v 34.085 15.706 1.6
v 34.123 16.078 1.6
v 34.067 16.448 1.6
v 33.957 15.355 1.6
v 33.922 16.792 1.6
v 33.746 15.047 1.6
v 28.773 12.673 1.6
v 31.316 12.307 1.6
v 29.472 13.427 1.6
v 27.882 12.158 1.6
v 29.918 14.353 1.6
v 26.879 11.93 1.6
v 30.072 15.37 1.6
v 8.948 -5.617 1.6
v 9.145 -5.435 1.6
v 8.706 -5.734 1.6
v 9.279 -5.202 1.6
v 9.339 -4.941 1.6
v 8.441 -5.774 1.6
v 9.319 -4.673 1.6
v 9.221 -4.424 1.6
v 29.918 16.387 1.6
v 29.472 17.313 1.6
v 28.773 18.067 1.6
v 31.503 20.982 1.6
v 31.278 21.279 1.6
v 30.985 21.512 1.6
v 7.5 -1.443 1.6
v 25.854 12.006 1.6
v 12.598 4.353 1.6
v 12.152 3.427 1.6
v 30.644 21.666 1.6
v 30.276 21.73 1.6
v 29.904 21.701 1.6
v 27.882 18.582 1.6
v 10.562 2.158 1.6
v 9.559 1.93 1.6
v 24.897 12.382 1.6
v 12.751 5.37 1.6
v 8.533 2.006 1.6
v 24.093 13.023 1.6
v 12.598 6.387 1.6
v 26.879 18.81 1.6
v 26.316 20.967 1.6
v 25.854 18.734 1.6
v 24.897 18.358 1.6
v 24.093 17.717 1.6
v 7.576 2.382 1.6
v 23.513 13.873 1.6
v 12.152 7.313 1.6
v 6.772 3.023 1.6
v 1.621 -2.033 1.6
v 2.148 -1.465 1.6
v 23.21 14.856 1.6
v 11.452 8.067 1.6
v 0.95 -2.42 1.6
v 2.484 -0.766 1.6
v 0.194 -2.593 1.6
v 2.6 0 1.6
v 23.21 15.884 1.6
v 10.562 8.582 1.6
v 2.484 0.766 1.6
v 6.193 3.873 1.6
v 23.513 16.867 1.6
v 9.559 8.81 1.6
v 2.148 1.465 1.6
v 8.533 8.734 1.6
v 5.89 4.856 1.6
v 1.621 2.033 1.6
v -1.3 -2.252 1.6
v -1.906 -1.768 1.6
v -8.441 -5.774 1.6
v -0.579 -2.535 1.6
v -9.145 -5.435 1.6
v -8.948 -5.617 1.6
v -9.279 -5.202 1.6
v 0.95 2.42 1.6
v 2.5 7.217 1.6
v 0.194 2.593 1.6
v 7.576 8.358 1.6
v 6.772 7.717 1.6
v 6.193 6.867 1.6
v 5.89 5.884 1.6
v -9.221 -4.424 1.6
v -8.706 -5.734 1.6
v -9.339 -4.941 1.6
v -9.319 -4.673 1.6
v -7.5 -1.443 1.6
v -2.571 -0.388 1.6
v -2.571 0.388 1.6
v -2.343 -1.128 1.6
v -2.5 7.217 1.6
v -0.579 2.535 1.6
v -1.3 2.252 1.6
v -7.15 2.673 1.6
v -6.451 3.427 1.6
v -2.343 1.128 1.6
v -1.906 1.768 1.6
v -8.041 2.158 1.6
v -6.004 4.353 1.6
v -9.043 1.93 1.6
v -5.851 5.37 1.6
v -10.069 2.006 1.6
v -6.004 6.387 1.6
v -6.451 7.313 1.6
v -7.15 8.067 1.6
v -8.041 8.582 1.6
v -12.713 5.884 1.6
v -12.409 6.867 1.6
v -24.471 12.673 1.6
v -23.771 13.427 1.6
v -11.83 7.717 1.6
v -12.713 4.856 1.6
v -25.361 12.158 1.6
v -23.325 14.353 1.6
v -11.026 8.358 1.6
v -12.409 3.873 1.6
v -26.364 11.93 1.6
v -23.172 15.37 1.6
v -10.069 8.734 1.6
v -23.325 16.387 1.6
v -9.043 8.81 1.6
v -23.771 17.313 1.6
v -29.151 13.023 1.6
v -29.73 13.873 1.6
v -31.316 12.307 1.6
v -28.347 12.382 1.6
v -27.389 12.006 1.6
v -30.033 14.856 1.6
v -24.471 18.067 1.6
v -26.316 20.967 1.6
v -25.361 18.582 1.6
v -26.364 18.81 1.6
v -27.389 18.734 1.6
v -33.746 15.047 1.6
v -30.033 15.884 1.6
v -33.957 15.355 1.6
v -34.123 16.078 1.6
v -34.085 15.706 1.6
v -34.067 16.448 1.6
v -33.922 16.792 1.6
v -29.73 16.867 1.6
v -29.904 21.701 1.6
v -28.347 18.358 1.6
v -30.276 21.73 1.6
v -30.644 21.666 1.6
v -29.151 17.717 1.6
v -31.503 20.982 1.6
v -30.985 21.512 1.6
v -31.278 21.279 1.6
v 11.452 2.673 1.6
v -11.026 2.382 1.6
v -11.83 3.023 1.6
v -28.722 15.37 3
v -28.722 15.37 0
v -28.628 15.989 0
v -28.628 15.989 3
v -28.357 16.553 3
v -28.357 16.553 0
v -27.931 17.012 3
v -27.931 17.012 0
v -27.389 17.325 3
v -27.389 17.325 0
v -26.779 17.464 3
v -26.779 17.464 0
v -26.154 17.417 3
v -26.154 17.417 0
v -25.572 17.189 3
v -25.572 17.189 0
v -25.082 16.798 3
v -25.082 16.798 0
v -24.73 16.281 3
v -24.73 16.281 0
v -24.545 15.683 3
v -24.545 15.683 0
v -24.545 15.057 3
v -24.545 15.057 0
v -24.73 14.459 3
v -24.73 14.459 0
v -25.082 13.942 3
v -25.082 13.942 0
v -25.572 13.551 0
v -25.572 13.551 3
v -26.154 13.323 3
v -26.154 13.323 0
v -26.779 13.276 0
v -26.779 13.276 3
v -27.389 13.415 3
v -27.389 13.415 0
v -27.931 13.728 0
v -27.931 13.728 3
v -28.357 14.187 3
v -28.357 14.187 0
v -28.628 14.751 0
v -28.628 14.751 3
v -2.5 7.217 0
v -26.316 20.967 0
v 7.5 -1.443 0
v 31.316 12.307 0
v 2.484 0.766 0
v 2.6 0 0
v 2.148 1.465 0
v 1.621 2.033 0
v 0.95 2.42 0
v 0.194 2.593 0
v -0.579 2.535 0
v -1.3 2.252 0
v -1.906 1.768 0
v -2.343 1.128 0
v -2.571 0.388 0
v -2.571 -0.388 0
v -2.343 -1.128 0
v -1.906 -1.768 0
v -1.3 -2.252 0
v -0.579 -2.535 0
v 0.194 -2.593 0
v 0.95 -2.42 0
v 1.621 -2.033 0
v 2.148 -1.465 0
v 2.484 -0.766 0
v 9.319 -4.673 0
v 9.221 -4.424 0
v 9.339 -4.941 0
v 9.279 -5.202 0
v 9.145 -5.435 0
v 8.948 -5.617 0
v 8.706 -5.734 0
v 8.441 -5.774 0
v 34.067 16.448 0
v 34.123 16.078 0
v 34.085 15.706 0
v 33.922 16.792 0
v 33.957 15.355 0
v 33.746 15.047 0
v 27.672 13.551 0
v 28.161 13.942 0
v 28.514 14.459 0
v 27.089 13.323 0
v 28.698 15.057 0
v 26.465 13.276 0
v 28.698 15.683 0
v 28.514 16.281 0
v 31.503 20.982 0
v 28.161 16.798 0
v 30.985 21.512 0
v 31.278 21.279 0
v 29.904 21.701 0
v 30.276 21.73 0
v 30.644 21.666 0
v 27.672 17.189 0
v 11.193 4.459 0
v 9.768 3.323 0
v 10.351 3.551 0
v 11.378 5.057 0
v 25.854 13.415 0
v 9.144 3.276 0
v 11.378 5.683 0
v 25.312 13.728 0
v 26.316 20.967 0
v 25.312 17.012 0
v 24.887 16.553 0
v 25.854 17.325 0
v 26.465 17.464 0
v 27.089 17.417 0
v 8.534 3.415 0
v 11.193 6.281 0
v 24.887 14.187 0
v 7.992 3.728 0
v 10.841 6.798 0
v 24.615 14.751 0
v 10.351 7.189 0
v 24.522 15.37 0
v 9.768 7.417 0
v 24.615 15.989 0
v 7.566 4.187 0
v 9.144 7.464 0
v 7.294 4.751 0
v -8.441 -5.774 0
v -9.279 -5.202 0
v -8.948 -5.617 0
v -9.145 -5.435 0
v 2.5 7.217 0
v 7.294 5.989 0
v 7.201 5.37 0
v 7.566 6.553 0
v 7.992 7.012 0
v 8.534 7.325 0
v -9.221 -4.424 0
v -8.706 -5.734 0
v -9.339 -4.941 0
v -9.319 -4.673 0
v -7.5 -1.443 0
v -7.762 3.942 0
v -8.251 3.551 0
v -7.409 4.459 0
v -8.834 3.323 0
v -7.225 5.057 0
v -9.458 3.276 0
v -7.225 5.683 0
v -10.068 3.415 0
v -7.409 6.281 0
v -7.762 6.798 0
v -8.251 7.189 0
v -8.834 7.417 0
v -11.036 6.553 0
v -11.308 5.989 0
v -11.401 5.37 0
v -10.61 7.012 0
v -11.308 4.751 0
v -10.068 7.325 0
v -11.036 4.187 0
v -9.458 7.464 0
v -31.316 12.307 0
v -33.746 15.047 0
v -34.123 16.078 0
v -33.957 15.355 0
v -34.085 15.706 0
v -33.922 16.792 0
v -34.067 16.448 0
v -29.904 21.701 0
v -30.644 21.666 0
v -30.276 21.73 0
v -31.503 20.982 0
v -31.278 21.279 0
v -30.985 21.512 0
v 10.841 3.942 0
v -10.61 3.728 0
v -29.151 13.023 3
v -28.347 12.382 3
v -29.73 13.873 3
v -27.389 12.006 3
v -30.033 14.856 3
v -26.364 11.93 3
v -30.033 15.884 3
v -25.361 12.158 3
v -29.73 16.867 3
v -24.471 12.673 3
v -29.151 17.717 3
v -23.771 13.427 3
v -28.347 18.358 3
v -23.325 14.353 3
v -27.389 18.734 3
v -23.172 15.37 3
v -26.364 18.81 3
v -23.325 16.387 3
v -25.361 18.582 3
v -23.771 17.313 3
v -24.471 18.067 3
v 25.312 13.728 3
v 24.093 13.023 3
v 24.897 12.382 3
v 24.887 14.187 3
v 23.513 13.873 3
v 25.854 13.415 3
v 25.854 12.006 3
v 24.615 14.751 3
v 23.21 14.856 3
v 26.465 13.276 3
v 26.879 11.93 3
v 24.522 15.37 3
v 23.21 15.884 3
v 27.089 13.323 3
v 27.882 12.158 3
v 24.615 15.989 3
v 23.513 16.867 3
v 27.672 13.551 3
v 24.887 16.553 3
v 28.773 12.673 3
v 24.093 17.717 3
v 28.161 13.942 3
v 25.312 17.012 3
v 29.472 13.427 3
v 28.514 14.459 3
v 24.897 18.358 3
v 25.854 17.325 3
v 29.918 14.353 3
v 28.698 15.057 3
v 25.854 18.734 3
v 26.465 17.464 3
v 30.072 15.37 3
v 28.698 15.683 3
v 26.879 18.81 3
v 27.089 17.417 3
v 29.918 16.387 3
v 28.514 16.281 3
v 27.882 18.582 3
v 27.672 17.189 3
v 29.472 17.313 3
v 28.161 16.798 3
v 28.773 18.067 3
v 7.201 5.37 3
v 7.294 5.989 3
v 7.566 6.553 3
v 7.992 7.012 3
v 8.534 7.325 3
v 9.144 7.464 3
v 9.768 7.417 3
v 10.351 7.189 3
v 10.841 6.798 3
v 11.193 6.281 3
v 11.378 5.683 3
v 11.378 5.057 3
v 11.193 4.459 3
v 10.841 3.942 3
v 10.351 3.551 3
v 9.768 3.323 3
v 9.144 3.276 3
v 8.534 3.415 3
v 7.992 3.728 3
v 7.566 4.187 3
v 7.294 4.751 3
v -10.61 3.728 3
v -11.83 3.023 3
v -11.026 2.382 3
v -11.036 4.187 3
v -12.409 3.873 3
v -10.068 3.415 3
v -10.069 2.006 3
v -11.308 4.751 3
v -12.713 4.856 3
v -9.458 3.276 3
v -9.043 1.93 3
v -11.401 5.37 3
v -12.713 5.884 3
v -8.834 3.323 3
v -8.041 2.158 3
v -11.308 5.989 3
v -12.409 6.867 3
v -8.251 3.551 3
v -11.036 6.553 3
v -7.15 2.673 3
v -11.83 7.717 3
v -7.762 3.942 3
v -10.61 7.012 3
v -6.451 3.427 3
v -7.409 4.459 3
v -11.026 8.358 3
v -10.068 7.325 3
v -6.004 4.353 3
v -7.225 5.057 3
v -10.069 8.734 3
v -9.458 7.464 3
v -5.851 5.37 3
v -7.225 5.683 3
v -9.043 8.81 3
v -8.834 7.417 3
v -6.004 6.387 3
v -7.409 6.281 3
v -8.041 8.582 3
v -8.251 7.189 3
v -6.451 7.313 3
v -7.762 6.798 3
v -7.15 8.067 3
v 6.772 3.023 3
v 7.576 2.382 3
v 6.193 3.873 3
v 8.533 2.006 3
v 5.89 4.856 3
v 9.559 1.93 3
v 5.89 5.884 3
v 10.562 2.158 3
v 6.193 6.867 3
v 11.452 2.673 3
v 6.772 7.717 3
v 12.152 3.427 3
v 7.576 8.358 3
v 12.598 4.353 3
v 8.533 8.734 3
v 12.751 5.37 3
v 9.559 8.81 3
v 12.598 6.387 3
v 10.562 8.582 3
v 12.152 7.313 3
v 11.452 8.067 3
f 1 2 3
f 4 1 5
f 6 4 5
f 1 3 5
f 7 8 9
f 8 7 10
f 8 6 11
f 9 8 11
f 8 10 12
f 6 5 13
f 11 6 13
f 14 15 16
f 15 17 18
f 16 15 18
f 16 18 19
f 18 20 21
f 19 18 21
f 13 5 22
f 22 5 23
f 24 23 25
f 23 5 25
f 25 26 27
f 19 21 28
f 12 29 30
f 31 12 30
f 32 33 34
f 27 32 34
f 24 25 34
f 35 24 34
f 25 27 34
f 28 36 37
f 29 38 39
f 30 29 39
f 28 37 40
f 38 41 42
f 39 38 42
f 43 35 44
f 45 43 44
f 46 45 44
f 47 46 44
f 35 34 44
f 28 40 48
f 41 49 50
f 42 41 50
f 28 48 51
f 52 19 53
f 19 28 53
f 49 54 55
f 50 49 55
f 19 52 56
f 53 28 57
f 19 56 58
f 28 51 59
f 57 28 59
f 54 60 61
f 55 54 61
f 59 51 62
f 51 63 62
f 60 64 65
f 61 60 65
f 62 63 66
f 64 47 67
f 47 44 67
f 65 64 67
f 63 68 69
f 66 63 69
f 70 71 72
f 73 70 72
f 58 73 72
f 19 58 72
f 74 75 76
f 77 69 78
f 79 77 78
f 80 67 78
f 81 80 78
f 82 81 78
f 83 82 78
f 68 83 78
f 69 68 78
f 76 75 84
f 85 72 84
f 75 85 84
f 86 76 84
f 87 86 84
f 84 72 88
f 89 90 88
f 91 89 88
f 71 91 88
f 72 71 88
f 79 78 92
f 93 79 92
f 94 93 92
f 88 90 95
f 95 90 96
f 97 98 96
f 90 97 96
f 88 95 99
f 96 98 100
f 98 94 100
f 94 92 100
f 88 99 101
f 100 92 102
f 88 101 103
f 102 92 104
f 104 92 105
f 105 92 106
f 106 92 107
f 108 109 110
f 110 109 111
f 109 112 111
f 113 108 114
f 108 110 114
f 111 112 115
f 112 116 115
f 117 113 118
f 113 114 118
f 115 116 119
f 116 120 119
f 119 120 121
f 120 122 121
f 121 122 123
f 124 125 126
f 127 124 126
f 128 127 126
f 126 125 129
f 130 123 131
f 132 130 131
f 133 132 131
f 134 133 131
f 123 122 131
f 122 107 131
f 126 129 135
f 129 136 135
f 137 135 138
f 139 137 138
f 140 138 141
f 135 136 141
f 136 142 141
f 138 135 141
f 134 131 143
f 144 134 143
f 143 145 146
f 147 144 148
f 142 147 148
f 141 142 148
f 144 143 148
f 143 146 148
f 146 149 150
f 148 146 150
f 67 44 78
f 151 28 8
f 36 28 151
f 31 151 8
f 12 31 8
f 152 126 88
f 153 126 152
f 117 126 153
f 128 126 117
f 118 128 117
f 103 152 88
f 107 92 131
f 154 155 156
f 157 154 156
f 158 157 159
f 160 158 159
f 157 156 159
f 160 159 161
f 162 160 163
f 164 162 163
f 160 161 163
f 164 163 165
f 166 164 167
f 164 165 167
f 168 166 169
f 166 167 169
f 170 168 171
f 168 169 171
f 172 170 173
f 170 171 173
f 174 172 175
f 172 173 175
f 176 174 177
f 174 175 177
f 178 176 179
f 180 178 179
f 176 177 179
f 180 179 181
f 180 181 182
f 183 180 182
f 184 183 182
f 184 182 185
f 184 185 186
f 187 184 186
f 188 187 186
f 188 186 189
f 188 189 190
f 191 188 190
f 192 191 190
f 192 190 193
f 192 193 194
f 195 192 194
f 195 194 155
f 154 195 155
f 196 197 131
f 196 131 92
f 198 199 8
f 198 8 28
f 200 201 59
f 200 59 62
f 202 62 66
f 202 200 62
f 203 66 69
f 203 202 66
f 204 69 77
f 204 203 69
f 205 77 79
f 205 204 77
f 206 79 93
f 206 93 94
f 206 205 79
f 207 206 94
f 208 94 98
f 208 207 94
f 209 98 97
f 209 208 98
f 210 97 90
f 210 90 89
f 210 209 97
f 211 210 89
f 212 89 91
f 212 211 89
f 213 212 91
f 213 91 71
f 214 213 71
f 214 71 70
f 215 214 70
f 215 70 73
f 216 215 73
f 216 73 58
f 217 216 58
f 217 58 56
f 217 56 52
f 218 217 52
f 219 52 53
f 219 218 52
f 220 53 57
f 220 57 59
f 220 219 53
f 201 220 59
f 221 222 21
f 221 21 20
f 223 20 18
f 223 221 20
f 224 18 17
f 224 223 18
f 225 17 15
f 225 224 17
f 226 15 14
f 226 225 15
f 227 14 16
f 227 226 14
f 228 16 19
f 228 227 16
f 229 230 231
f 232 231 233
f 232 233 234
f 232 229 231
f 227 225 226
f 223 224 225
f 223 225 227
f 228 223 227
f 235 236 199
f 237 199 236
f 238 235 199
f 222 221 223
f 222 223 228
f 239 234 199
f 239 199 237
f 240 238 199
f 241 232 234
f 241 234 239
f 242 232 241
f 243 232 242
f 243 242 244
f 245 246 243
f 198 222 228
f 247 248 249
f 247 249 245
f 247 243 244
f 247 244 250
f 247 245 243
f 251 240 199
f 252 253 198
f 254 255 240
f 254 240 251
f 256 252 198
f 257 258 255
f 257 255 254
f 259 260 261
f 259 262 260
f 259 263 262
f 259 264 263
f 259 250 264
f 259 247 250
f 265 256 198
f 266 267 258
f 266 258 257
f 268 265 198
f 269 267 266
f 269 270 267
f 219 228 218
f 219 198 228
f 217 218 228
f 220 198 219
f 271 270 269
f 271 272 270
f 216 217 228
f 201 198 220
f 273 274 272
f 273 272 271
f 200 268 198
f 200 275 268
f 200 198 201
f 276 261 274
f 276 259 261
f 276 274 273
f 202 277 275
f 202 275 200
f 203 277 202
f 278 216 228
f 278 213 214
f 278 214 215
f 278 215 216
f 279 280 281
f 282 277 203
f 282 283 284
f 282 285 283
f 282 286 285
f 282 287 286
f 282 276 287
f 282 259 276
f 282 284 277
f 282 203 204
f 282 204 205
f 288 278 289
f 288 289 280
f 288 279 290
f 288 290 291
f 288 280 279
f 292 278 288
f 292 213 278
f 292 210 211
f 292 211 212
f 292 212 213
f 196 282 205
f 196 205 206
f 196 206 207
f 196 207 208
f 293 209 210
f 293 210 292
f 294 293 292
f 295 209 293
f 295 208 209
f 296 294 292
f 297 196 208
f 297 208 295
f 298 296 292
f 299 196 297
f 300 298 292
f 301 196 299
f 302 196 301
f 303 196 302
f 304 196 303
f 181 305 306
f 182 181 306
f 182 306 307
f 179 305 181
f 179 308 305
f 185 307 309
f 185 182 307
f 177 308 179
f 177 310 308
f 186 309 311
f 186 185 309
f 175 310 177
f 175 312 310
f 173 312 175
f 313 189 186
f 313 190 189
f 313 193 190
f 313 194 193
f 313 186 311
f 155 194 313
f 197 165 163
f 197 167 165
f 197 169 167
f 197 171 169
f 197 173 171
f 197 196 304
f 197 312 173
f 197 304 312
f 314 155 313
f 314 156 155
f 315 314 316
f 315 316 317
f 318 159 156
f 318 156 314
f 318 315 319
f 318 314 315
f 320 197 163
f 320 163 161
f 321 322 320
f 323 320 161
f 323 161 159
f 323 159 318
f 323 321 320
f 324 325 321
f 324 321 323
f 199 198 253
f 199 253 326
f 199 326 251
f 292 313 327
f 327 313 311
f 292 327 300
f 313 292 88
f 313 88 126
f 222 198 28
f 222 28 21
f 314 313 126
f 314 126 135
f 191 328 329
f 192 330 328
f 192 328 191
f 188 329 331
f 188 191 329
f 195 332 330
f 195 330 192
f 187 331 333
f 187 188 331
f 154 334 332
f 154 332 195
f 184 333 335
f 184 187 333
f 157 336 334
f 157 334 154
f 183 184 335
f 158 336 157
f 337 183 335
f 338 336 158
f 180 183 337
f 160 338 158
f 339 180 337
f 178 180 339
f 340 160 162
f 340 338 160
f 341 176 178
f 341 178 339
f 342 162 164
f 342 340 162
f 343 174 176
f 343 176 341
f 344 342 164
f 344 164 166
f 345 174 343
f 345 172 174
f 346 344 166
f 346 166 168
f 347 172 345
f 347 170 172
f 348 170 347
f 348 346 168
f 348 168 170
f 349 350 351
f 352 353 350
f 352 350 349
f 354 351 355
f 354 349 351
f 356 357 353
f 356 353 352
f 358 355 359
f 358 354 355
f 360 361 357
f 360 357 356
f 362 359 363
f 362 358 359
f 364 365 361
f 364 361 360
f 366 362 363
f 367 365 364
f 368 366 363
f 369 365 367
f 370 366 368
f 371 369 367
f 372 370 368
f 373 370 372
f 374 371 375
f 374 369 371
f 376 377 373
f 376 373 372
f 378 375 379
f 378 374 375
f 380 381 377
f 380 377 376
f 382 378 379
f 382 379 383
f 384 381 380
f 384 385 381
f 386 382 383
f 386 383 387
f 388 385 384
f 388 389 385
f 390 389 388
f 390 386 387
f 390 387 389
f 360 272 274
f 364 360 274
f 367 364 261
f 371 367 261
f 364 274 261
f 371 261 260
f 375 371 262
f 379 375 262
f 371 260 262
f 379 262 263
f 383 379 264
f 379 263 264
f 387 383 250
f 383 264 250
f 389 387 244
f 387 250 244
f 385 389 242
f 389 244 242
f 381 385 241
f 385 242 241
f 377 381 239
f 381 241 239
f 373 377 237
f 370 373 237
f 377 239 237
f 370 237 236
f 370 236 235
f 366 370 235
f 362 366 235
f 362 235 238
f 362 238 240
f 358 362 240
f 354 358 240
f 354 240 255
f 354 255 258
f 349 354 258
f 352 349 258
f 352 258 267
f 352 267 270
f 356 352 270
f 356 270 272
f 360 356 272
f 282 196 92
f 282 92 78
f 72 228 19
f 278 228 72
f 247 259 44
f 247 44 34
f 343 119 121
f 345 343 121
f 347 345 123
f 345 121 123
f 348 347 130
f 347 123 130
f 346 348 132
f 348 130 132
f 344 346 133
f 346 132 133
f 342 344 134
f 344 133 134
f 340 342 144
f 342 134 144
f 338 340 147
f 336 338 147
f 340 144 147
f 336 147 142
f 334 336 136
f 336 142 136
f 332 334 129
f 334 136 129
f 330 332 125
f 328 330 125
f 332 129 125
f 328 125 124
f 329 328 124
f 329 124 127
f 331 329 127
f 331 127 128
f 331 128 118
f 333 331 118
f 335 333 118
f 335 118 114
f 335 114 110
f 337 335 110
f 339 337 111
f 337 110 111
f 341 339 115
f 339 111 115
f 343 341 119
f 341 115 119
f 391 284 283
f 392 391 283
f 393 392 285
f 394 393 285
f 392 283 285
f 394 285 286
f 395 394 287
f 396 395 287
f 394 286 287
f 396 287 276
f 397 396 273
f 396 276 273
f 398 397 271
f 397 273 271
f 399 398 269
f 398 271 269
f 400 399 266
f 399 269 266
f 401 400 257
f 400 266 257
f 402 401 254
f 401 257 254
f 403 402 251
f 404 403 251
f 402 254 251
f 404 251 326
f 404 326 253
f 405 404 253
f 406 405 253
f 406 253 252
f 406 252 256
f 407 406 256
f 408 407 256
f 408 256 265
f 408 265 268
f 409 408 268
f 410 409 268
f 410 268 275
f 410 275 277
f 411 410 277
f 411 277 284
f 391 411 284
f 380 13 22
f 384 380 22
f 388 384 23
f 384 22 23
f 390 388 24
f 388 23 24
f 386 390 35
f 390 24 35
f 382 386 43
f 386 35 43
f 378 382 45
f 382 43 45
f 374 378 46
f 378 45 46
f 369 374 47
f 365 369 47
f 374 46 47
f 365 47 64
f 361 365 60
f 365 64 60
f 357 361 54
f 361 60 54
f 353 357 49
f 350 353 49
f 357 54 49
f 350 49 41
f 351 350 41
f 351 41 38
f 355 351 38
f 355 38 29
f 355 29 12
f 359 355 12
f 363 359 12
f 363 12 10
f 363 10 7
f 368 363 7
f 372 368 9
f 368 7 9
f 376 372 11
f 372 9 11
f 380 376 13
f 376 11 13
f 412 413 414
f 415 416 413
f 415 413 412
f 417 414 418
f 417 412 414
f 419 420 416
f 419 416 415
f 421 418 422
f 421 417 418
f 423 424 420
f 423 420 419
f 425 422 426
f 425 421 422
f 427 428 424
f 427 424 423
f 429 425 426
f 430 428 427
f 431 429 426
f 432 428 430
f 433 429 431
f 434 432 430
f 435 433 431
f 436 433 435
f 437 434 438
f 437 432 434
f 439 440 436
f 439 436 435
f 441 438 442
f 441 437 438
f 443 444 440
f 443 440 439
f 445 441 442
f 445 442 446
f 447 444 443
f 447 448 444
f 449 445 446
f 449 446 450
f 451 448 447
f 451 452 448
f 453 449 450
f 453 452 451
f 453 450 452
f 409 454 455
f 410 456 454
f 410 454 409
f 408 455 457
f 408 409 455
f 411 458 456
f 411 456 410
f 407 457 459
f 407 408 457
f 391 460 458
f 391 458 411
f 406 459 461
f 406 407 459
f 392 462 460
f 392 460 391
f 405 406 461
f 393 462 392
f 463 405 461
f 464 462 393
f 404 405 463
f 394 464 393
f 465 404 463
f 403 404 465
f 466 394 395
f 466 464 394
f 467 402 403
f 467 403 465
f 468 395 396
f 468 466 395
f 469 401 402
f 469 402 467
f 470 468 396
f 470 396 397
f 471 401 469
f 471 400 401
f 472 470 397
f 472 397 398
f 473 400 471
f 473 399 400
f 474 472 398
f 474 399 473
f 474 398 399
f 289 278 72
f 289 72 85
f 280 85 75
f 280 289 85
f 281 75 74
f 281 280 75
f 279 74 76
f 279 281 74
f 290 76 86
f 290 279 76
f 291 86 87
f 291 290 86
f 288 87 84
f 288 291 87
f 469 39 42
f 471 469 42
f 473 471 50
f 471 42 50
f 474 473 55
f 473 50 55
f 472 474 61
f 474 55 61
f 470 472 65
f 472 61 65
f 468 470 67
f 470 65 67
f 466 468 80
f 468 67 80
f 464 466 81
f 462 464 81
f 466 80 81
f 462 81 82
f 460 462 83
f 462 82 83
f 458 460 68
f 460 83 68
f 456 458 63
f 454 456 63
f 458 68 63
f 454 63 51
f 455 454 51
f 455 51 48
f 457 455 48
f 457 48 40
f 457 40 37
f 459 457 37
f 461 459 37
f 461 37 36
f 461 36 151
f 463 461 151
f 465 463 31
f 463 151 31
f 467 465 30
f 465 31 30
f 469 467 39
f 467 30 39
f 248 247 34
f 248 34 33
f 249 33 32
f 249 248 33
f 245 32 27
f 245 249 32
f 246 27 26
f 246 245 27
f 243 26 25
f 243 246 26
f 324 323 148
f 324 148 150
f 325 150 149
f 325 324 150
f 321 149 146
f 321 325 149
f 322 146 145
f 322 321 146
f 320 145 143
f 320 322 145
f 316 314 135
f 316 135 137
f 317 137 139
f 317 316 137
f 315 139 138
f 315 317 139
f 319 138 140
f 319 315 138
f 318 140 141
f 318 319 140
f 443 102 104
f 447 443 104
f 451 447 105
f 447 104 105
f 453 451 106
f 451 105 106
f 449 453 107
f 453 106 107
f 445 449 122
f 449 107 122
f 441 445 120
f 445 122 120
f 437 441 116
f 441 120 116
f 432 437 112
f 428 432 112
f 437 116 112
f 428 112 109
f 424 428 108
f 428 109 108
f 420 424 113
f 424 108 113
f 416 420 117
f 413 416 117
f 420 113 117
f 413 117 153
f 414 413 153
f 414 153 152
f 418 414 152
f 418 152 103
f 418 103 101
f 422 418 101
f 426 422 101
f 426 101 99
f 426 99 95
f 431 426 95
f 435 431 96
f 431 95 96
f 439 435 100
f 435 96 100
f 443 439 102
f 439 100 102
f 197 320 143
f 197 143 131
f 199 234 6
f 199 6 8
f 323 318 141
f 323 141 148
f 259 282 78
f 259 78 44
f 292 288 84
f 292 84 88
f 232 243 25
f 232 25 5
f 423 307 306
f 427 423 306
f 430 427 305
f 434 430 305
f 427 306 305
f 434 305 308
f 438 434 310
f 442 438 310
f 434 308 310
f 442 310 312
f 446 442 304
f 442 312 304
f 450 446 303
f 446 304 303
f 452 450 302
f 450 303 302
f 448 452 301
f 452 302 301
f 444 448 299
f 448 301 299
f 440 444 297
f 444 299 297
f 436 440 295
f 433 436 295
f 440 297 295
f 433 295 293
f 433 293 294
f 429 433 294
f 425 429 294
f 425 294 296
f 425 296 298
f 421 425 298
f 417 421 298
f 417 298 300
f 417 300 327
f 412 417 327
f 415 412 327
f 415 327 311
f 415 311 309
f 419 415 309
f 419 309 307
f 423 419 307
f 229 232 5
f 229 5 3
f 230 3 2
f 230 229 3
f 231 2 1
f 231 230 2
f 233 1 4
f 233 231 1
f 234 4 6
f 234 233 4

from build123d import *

# Parameters (mm, degrees)
SKETCH1_R             = 2.6
BOSS_EXTRUDE1_DEPTH   = 1.6
SKETCH2_R             = 3.45
BOSS_EXTRUDE2_DEPTH   = 1.4
M5X0_8_TAPPED_HOLE1_D = 4.2


with BuildPart() as part:
    # Sketch1 → Boss-Extrude1 (new body)
    with BuildSketch(Plane.XY):
        with BuildLine():
            Line((-2.5, 7.216878365), (2.5, 7.216878365))
            Line((2.5, 7.216878365), (26.315698604, 20.966878365))
            Line((26.315698604, 20.966878365), (29.903623675, 21.701093146))
            ThreePointArc((29.903623675, 21.701093146), (30.819646028, 21.599539147), (31.503382336, 20.981546567))
            Line((31.503382336, 20.981546567), (33.922243506, 16.791956125))
            ThreePointArc((33.922243506, 16.791956125), (34.115572625, 15.890826823), (33.745509792, 15.046751195))
            Line((33.745509792, 15.046751195), (31.315698604, 12.306624327))
            Line((31.315698604, 12.306624327), (7.5, -1.443375673))
            Line((7.5, -1.443375673), (9.220577137, -4.423502692))
            ThreePointArc((9.220577137, -4.423502692), (9.220577137, -5.323502692), (8.441154273, -5.773502692))
            Line((8.441154273, -5.773502692), (-8.441154273, -5.773502692))
            ThreePointArc((-8.441154273, -5.773502692), (-9.220577137, -5.323502692), (-9.220577137, -4.423502692))
            Line((-9.220577137, -4.423502692), (-7.5, -1.443375673))
            Line((-7.5, -1.443375673), (-31.315698604, 12.306624327))
            Line((-31.315698604, 12.306624327), (-33.745509792, 15.046751195))
            ThreePointArc((-33.745509792, 15.046751195), (-34.115572625, 15.890826823), (-33.922243506, 16.791956125))
            Line((-33.922243506, 16.791956125), (-31.503382336, 20.981546567))
            ThreePointArc((-31.503382336, 20.981546567), (-30.819646028, 21.599539147), (-29.903623675, 21.701093146))
            Line((-29.903623675, 21.701093146), (-26.315698604, 20.966878365))
            Line((-26.315698604, 20.966878365), (-2.5, 7.216878365))
        make_face()
        Circle(SKETCH1_R, mode=Mode.SUBTRACT)
    extrude(amount=BOSS_EXTRUDE1_DEPTH)

    # Sketch2 → Boss-Extrude2 (add)
    with BuildSketch(Plane.XY.offset(1.6)):
        with Locations((26.621620912, 15.37)):
            Circle(SKETCH2_R)
        with Locations((9.301112837, 5.37)):
            Circle(SKETCH2_R)
        with Locations((-9.301112837, 5.37)):
            Circle(SKETCH2_R)
        with Locations((-26.621620912, 15.37)):
            Circle(SKETCH2_R)
    extrude(amount=BOSS_EXTRUDE2_DEPTH)

    # M5x0.8 Tapped Hole1 (through all)
    with Locations(Plane.XY.offset(3)):
        with Locations((26.621620912, 15.37), (9.301112837, 5.37), (-9.301112837, 5.37), (-26.621620912, 15.37)):
            Hole(M5X0_8_TAPPED_HOLE1_D / 2)


solid = part.part
